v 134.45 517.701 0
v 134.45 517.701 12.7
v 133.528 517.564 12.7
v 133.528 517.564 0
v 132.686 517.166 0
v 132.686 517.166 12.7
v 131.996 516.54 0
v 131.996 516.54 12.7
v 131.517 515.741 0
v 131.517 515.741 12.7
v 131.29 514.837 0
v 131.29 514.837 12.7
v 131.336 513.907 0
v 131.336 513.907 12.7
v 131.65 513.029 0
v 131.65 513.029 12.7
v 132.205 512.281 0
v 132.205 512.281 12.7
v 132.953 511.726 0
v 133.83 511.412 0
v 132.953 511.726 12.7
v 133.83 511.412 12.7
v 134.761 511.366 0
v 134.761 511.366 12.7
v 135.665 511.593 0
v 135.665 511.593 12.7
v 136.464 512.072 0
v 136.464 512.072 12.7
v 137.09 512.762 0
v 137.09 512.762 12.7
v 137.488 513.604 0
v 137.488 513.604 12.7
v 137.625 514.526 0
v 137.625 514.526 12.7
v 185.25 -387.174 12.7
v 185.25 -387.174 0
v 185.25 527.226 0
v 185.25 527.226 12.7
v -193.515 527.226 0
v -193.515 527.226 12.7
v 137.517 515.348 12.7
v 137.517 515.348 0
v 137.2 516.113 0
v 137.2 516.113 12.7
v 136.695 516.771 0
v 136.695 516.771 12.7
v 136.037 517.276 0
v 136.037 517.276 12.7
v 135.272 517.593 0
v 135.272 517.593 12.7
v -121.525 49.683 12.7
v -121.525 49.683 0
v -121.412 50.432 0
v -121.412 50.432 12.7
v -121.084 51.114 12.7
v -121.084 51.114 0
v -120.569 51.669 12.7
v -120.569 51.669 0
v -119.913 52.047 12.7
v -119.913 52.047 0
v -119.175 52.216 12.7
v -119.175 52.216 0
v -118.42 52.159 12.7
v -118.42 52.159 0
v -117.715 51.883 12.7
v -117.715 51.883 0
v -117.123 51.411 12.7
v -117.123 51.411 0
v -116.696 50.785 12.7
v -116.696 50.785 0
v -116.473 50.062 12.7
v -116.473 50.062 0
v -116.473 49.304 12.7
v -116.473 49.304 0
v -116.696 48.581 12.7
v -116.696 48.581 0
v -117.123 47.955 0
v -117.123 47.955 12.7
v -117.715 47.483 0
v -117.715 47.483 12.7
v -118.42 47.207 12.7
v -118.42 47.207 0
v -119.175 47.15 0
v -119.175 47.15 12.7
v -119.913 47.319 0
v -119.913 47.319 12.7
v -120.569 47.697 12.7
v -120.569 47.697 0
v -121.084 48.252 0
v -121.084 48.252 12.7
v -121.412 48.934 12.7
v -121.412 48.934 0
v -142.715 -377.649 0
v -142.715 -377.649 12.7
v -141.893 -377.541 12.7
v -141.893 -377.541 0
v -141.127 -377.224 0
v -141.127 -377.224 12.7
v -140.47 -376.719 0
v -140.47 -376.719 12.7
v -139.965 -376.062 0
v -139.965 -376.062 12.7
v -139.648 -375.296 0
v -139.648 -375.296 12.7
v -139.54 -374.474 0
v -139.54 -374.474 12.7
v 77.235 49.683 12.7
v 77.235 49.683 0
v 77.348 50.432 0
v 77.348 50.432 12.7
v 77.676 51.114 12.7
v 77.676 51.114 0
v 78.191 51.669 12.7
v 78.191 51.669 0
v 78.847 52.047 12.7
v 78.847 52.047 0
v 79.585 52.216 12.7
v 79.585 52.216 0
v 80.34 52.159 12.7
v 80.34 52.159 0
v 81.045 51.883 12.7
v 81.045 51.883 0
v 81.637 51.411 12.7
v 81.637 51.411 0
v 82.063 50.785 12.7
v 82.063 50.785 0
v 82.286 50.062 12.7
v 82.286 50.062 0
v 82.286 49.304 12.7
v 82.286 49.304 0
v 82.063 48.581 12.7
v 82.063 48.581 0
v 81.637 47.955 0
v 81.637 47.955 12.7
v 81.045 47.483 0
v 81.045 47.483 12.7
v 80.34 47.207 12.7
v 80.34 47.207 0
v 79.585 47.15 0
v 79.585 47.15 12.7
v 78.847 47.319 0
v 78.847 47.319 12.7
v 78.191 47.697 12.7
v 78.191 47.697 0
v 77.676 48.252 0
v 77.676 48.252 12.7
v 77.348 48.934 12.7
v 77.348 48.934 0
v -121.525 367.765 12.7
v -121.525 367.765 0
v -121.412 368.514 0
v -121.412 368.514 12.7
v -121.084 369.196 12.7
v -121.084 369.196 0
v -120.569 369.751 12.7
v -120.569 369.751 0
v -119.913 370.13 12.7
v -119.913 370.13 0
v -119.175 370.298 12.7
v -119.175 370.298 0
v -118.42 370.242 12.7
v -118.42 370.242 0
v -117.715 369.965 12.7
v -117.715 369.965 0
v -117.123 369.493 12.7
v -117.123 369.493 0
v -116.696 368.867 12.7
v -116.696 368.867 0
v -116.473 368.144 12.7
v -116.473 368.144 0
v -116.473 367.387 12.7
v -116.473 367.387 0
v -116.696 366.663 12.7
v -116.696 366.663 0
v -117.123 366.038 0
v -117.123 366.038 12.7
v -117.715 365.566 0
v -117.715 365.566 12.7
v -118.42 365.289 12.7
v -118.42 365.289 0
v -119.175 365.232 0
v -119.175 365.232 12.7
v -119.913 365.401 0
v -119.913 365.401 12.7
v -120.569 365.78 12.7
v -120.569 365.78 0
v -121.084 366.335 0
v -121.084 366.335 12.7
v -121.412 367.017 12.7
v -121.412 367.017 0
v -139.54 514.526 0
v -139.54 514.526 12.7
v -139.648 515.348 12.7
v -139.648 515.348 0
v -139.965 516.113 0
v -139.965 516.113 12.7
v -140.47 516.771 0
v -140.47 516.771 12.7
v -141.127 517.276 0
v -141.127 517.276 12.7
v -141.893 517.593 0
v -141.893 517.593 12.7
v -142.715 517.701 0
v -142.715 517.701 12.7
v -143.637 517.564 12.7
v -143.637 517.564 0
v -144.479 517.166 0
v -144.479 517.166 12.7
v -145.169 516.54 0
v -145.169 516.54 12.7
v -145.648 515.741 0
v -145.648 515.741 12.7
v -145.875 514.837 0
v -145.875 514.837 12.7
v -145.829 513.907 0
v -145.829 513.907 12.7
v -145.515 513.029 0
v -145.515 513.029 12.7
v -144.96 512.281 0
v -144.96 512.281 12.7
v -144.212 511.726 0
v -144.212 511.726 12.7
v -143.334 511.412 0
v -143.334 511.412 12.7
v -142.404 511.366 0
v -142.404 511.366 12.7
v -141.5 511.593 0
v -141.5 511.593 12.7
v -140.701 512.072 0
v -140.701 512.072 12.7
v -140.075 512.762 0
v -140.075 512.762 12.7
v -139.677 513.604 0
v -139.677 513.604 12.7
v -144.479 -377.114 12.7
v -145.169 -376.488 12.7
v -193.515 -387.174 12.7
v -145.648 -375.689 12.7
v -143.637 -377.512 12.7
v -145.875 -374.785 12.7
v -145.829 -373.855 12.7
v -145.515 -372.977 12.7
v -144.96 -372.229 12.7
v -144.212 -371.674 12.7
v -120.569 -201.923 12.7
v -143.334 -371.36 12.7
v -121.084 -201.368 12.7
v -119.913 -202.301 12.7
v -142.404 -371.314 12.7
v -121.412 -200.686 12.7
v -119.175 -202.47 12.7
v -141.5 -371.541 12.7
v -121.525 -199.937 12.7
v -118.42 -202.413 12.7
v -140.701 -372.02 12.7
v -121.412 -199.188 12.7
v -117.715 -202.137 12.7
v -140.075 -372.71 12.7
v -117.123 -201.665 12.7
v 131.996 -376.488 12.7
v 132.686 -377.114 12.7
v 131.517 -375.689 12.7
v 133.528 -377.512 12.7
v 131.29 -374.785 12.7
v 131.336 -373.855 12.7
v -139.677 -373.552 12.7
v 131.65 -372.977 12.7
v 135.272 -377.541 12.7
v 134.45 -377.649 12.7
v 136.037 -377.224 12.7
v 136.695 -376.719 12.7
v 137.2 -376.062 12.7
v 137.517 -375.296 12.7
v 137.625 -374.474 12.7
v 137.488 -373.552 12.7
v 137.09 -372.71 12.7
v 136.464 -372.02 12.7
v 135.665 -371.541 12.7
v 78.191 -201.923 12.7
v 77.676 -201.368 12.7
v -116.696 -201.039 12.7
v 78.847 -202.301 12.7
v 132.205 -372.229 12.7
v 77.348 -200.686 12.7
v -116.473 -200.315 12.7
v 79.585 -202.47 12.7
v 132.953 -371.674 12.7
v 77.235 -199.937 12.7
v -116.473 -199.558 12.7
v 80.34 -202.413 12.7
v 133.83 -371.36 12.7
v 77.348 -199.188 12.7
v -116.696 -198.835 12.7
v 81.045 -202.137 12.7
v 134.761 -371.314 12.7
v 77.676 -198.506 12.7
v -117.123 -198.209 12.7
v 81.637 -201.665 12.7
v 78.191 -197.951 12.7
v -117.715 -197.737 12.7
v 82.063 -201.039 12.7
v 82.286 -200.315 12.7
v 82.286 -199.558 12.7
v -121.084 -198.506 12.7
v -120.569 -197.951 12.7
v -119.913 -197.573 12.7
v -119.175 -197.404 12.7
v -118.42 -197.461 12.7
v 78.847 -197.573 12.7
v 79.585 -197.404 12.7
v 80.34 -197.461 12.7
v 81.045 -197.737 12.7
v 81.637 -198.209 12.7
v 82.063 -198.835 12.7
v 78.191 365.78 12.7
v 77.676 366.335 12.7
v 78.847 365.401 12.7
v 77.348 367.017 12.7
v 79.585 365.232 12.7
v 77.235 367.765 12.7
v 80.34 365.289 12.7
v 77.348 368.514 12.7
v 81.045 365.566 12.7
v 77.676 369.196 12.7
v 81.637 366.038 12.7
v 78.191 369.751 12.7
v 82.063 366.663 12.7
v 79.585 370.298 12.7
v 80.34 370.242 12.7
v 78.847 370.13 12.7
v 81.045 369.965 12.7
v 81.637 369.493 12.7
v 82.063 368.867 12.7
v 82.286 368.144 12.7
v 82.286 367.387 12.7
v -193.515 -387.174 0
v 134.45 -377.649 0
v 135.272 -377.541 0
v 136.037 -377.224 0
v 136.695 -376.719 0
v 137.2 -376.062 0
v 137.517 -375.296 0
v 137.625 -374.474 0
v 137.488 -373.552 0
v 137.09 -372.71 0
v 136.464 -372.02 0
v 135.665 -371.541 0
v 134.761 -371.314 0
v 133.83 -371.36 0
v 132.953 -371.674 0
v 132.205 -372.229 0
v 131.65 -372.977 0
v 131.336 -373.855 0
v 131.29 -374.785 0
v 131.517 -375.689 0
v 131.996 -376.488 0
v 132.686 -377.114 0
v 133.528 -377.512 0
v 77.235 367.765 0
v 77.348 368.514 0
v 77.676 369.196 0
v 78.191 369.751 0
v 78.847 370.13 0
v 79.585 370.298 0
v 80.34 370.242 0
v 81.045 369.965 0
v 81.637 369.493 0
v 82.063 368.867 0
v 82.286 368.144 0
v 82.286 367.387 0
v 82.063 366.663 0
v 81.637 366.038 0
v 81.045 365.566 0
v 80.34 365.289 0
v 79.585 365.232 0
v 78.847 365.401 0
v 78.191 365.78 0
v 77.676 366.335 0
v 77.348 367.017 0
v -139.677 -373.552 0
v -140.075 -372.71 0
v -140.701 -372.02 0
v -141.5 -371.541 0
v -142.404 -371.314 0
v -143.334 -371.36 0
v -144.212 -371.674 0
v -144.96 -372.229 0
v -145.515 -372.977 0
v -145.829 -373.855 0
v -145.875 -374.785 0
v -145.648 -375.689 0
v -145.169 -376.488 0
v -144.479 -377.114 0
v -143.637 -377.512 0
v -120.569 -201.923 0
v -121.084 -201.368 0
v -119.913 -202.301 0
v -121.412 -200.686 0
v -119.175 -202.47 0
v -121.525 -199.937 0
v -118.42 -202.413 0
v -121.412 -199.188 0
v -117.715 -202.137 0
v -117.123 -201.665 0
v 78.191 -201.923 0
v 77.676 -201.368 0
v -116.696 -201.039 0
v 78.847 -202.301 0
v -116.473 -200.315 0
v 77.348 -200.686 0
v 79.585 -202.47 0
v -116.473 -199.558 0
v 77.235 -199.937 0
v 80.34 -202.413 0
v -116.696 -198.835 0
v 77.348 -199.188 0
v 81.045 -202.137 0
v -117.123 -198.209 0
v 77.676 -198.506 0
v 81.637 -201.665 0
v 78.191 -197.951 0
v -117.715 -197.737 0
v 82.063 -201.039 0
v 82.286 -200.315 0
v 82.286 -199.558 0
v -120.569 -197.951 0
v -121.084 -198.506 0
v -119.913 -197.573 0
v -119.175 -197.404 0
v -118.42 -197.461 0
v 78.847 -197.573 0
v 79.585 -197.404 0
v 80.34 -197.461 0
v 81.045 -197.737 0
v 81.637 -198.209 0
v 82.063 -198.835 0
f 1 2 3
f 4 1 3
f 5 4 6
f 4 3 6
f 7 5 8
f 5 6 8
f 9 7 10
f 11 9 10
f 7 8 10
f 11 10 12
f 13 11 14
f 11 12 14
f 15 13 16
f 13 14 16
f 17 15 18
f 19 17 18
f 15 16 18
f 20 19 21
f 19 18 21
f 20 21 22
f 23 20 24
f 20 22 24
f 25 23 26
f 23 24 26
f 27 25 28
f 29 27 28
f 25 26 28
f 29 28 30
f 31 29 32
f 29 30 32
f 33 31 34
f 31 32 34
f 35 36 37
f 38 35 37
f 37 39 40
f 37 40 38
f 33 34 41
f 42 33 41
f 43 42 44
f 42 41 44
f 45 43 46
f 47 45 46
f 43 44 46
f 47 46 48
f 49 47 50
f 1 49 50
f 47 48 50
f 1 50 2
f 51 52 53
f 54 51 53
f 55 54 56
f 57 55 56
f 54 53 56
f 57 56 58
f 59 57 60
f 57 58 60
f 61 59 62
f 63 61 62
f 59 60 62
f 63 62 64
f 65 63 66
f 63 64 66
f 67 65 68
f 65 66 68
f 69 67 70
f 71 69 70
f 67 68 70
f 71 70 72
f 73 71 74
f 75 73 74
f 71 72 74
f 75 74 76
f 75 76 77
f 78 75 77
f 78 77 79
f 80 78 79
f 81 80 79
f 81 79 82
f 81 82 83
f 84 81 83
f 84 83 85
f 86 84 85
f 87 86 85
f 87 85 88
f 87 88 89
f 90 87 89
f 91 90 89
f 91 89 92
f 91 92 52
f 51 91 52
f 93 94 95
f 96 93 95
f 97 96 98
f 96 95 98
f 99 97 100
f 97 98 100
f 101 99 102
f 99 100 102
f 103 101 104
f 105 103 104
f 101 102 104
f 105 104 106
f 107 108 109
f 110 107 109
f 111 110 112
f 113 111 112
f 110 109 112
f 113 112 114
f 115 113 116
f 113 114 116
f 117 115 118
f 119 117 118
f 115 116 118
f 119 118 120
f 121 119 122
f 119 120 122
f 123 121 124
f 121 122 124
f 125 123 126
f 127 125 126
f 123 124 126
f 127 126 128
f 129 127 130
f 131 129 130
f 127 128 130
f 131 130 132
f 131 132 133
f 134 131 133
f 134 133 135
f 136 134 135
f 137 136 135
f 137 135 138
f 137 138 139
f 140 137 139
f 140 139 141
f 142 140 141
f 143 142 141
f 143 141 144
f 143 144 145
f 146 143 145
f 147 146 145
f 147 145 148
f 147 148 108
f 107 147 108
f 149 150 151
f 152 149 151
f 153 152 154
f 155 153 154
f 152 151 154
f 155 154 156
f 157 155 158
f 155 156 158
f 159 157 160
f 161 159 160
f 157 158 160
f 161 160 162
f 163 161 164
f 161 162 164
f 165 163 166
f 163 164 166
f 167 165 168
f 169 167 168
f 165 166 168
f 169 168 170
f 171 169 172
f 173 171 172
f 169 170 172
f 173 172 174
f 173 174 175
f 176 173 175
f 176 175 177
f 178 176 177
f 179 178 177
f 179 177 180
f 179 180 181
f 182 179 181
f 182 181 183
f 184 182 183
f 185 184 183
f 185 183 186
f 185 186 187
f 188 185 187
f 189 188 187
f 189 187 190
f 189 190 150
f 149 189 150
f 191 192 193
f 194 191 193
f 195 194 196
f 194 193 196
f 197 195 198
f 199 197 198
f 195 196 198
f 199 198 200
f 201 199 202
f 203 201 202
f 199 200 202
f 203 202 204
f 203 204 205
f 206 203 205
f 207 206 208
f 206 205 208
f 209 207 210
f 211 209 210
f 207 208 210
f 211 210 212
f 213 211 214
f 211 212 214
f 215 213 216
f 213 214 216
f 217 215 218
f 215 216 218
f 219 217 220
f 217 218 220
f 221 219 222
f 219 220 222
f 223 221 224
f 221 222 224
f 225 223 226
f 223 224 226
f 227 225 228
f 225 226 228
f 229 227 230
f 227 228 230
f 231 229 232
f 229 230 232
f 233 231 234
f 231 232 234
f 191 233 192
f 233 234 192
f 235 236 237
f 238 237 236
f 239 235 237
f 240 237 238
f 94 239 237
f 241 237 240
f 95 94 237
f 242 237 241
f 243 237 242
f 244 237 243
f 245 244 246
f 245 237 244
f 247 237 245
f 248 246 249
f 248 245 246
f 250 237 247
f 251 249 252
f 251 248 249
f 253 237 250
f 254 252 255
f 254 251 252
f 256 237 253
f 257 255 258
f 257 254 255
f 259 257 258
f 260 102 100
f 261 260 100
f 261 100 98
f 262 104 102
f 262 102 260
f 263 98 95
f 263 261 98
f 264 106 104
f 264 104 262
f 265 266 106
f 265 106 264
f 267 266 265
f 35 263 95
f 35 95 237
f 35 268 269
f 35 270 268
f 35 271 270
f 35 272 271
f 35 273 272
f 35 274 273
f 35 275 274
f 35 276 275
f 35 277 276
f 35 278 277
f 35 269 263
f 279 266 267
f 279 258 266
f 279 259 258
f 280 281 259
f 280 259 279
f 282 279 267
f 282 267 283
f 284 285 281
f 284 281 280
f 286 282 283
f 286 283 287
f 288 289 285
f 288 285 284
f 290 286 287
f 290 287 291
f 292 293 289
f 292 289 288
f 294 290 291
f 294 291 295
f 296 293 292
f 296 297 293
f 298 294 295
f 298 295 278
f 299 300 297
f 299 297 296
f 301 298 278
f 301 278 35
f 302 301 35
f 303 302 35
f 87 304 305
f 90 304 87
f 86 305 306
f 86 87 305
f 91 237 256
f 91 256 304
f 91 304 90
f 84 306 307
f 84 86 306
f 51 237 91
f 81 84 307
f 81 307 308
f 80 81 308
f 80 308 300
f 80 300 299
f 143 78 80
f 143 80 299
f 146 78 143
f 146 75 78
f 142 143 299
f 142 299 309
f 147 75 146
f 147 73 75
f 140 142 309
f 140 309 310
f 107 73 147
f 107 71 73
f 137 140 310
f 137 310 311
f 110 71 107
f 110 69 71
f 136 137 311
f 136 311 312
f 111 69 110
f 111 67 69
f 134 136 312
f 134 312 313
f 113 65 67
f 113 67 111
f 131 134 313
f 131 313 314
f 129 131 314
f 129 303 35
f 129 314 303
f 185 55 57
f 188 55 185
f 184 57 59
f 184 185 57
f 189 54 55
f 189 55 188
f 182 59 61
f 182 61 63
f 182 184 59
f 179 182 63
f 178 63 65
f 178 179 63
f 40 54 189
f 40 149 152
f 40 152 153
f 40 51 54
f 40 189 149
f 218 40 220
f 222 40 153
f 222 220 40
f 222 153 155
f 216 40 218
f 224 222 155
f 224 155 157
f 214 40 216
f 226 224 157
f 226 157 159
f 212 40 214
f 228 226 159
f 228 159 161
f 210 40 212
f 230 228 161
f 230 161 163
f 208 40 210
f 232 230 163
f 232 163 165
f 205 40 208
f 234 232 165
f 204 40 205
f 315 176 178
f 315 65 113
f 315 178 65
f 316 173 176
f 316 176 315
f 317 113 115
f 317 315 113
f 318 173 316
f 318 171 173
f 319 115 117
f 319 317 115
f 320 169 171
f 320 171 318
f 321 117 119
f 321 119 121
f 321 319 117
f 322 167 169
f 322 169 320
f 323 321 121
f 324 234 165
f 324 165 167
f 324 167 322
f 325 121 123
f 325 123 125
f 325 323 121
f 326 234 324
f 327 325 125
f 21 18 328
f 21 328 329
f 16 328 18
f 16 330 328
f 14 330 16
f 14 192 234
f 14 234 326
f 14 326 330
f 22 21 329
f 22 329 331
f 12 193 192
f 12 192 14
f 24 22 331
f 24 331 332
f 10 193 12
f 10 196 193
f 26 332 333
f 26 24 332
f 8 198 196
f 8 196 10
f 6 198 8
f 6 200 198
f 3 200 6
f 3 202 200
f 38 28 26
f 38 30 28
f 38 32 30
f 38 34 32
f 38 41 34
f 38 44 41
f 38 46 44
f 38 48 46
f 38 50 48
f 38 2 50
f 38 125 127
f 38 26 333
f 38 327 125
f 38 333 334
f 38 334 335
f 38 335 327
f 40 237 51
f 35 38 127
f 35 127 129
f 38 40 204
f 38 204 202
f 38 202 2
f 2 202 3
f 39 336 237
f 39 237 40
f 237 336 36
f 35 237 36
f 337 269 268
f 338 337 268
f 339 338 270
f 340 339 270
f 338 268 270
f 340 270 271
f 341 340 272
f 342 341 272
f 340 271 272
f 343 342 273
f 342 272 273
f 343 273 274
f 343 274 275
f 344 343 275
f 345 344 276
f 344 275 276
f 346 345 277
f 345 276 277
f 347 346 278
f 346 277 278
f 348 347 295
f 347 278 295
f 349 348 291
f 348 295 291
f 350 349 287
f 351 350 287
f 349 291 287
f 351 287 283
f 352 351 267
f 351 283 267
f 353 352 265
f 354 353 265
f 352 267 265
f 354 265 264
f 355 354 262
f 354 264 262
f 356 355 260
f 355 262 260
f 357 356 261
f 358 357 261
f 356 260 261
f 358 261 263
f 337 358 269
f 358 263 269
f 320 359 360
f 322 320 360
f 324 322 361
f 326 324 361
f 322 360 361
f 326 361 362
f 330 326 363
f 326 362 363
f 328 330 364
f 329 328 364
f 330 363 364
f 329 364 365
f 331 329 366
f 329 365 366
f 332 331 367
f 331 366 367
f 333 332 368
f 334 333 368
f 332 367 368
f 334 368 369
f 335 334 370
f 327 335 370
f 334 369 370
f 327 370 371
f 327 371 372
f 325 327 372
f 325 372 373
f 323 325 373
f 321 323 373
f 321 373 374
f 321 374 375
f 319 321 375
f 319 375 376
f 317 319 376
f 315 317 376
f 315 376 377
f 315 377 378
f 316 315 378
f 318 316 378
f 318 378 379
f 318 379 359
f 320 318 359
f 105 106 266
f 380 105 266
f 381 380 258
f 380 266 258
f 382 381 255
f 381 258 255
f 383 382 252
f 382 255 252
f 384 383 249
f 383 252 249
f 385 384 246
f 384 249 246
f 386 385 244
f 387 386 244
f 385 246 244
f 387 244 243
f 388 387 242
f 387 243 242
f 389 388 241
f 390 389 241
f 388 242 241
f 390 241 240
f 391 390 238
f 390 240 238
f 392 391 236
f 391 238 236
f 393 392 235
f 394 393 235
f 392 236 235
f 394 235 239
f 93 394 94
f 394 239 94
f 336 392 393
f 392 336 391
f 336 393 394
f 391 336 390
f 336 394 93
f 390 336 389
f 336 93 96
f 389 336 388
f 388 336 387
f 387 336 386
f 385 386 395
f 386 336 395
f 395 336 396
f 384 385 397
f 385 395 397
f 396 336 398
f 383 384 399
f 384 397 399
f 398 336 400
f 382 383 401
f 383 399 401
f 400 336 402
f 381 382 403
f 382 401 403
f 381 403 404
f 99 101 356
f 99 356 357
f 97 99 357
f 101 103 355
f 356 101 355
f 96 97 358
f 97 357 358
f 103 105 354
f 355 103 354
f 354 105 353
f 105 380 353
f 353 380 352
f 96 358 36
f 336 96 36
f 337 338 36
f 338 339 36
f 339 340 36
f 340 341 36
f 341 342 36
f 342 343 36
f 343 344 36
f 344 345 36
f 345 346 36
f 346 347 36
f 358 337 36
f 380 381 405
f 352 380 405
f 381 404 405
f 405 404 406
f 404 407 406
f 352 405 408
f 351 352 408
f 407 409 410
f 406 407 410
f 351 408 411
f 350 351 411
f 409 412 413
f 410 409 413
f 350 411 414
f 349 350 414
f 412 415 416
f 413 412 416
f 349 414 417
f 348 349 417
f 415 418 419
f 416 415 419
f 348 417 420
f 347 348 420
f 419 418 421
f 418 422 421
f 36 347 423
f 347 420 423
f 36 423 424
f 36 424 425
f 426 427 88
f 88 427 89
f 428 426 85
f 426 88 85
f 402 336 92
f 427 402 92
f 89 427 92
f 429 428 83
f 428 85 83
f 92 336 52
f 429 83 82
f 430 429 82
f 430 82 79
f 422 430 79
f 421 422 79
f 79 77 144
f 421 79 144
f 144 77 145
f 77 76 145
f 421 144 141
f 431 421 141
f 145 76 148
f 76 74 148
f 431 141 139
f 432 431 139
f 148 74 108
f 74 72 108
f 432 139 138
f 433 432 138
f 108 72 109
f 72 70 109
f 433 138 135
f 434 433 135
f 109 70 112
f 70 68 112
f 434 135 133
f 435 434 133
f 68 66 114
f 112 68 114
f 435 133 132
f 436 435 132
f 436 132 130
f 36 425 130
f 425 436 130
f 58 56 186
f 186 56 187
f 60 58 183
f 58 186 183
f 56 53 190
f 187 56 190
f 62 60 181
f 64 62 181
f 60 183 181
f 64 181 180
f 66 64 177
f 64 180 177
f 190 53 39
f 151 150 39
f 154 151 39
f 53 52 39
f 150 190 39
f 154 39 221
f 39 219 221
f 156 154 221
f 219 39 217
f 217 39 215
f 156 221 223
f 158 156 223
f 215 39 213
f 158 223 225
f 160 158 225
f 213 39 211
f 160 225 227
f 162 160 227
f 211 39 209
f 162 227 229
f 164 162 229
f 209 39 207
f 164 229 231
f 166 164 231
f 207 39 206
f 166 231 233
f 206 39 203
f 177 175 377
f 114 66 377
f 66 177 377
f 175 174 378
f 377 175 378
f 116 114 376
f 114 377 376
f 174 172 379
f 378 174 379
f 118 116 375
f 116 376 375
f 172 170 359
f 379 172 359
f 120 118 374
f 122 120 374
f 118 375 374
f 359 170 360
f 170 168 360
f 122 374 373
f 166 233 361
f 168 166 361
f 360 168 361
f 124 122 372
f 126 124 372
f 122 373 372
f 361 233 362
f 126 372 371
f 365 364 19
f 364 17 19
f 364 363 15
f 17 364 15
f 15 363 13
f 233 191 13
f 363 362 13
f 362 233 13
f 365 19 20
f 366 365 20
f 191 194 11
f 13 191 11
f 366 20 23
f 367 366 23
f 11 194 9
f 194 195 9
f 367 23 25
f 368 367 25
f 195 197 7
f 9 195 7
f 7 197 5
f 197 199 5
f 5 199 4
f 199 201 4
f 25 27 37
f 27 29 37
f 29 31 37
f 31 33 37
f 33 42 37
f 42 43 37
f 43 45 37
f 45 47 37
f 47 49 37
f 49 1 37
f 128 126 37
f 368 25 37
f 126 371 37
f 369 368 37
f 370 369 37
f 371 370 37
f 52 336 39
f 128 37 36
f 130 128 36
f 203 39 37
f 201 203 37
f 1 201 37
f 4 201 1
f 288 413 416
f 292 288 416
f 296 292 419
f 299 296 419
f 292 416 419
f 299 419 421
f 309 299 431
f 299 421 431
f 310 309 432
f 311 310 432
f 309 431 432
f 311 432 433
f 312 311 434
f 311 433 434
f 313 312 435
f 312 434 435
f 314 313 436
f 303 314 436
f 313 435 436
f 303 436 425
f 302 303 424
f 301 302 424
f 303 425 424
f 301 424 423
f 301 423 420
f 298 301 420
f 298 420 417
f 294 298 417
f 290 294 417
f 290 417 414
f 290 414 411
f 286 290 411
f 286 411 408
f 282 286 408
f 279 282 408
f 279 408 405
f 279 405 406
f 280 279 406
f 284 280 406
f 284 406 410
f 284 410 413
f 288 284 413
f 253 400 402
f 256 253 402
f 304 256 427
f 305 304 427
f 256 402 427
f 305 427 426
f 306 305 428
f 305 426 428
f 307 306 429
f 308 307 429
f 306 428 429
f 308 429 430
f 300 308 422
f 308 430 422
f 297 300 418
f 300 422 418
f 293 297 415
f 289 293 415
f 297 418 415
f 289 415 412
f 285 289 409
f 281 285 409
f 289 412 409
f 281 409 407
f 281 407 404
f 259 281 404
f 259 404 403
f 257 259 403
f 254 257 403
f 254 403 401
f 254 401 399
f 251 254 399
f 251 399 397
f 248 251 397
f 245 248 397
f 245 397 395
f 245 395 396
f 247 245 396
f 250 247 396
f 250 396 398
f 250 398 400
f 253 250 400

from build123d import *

# Parameters (mm, degrees)
F0_W     = 378.7648
F0_H     = 914.4
F1_DEPTH = 12.7
F3_DEPTH = 12.701
F5_D     = 5.08


with BuildPart() as f1:
    # F0 (on Top) → F1 (new body)
    with BuildSketch(Plane.XY):
        with Locations((-4.132511, 70.025934)):
            Rectangle(F0_W, F0_H)
    extrude(amount=F1_DEPTH)

    # F2 (on face) → F3 (cut, through all)
    with BuildSketch(Plane.XY.offset(12.7)):
        with BuildLine():
            ThreePointArc((-142.714911, 517.700934), (-144.959975, 512.28087), (-139.539911, 514.525934))
            ThreePointArc((-139.539911, 514.525934), (-140.469847, 516.770998), (-142.714911, 517.700934))
        make_face()
        with BuildLine():
            ThreePointArc((134.449889, 517.700934), (132.204825, 512.28087), (137.624889, 514.525934))
            ThreePointArc((137.624889, 514.525934), (136.694953, 516.770998), (134.449889, 517.700934))
        make_face()
        with BuildLine():
            ThreePointArc((-142.714911, -377.649066), (-140.469847, -376.71913), (-139.539911, -374.474066))
            ThreePointArc((-139.539911, -374.474066), (-144.959975, -372.229002), (-142.714911, -377.649066))
        make_face()
        with BuildLine():
            ThreePointArc((134.449889, -377.649066), (136.694953, -376.71913), (137.624889, -374.474066))
            ThreePointArc((137.624889, -374.474066), (132.204825, -372.229002), (134.449889, -377.649066))
        make_face()
    extrude(amount=-F3_DEPTH, mode=Mode.SUBTRACT)

    # F5 (through all)
    with Locations(Plane.XY.offset(12.7)):
        with Locations((-118.98496, 49.682964), (79.774782, 49.682964), (-118.98496, 367.765397), (79.774782, 367.765397), (-118.98496, -199.936926), (79.774782, -199.936926)):
            Hole(F5_D / 2)


solid = f1.part
